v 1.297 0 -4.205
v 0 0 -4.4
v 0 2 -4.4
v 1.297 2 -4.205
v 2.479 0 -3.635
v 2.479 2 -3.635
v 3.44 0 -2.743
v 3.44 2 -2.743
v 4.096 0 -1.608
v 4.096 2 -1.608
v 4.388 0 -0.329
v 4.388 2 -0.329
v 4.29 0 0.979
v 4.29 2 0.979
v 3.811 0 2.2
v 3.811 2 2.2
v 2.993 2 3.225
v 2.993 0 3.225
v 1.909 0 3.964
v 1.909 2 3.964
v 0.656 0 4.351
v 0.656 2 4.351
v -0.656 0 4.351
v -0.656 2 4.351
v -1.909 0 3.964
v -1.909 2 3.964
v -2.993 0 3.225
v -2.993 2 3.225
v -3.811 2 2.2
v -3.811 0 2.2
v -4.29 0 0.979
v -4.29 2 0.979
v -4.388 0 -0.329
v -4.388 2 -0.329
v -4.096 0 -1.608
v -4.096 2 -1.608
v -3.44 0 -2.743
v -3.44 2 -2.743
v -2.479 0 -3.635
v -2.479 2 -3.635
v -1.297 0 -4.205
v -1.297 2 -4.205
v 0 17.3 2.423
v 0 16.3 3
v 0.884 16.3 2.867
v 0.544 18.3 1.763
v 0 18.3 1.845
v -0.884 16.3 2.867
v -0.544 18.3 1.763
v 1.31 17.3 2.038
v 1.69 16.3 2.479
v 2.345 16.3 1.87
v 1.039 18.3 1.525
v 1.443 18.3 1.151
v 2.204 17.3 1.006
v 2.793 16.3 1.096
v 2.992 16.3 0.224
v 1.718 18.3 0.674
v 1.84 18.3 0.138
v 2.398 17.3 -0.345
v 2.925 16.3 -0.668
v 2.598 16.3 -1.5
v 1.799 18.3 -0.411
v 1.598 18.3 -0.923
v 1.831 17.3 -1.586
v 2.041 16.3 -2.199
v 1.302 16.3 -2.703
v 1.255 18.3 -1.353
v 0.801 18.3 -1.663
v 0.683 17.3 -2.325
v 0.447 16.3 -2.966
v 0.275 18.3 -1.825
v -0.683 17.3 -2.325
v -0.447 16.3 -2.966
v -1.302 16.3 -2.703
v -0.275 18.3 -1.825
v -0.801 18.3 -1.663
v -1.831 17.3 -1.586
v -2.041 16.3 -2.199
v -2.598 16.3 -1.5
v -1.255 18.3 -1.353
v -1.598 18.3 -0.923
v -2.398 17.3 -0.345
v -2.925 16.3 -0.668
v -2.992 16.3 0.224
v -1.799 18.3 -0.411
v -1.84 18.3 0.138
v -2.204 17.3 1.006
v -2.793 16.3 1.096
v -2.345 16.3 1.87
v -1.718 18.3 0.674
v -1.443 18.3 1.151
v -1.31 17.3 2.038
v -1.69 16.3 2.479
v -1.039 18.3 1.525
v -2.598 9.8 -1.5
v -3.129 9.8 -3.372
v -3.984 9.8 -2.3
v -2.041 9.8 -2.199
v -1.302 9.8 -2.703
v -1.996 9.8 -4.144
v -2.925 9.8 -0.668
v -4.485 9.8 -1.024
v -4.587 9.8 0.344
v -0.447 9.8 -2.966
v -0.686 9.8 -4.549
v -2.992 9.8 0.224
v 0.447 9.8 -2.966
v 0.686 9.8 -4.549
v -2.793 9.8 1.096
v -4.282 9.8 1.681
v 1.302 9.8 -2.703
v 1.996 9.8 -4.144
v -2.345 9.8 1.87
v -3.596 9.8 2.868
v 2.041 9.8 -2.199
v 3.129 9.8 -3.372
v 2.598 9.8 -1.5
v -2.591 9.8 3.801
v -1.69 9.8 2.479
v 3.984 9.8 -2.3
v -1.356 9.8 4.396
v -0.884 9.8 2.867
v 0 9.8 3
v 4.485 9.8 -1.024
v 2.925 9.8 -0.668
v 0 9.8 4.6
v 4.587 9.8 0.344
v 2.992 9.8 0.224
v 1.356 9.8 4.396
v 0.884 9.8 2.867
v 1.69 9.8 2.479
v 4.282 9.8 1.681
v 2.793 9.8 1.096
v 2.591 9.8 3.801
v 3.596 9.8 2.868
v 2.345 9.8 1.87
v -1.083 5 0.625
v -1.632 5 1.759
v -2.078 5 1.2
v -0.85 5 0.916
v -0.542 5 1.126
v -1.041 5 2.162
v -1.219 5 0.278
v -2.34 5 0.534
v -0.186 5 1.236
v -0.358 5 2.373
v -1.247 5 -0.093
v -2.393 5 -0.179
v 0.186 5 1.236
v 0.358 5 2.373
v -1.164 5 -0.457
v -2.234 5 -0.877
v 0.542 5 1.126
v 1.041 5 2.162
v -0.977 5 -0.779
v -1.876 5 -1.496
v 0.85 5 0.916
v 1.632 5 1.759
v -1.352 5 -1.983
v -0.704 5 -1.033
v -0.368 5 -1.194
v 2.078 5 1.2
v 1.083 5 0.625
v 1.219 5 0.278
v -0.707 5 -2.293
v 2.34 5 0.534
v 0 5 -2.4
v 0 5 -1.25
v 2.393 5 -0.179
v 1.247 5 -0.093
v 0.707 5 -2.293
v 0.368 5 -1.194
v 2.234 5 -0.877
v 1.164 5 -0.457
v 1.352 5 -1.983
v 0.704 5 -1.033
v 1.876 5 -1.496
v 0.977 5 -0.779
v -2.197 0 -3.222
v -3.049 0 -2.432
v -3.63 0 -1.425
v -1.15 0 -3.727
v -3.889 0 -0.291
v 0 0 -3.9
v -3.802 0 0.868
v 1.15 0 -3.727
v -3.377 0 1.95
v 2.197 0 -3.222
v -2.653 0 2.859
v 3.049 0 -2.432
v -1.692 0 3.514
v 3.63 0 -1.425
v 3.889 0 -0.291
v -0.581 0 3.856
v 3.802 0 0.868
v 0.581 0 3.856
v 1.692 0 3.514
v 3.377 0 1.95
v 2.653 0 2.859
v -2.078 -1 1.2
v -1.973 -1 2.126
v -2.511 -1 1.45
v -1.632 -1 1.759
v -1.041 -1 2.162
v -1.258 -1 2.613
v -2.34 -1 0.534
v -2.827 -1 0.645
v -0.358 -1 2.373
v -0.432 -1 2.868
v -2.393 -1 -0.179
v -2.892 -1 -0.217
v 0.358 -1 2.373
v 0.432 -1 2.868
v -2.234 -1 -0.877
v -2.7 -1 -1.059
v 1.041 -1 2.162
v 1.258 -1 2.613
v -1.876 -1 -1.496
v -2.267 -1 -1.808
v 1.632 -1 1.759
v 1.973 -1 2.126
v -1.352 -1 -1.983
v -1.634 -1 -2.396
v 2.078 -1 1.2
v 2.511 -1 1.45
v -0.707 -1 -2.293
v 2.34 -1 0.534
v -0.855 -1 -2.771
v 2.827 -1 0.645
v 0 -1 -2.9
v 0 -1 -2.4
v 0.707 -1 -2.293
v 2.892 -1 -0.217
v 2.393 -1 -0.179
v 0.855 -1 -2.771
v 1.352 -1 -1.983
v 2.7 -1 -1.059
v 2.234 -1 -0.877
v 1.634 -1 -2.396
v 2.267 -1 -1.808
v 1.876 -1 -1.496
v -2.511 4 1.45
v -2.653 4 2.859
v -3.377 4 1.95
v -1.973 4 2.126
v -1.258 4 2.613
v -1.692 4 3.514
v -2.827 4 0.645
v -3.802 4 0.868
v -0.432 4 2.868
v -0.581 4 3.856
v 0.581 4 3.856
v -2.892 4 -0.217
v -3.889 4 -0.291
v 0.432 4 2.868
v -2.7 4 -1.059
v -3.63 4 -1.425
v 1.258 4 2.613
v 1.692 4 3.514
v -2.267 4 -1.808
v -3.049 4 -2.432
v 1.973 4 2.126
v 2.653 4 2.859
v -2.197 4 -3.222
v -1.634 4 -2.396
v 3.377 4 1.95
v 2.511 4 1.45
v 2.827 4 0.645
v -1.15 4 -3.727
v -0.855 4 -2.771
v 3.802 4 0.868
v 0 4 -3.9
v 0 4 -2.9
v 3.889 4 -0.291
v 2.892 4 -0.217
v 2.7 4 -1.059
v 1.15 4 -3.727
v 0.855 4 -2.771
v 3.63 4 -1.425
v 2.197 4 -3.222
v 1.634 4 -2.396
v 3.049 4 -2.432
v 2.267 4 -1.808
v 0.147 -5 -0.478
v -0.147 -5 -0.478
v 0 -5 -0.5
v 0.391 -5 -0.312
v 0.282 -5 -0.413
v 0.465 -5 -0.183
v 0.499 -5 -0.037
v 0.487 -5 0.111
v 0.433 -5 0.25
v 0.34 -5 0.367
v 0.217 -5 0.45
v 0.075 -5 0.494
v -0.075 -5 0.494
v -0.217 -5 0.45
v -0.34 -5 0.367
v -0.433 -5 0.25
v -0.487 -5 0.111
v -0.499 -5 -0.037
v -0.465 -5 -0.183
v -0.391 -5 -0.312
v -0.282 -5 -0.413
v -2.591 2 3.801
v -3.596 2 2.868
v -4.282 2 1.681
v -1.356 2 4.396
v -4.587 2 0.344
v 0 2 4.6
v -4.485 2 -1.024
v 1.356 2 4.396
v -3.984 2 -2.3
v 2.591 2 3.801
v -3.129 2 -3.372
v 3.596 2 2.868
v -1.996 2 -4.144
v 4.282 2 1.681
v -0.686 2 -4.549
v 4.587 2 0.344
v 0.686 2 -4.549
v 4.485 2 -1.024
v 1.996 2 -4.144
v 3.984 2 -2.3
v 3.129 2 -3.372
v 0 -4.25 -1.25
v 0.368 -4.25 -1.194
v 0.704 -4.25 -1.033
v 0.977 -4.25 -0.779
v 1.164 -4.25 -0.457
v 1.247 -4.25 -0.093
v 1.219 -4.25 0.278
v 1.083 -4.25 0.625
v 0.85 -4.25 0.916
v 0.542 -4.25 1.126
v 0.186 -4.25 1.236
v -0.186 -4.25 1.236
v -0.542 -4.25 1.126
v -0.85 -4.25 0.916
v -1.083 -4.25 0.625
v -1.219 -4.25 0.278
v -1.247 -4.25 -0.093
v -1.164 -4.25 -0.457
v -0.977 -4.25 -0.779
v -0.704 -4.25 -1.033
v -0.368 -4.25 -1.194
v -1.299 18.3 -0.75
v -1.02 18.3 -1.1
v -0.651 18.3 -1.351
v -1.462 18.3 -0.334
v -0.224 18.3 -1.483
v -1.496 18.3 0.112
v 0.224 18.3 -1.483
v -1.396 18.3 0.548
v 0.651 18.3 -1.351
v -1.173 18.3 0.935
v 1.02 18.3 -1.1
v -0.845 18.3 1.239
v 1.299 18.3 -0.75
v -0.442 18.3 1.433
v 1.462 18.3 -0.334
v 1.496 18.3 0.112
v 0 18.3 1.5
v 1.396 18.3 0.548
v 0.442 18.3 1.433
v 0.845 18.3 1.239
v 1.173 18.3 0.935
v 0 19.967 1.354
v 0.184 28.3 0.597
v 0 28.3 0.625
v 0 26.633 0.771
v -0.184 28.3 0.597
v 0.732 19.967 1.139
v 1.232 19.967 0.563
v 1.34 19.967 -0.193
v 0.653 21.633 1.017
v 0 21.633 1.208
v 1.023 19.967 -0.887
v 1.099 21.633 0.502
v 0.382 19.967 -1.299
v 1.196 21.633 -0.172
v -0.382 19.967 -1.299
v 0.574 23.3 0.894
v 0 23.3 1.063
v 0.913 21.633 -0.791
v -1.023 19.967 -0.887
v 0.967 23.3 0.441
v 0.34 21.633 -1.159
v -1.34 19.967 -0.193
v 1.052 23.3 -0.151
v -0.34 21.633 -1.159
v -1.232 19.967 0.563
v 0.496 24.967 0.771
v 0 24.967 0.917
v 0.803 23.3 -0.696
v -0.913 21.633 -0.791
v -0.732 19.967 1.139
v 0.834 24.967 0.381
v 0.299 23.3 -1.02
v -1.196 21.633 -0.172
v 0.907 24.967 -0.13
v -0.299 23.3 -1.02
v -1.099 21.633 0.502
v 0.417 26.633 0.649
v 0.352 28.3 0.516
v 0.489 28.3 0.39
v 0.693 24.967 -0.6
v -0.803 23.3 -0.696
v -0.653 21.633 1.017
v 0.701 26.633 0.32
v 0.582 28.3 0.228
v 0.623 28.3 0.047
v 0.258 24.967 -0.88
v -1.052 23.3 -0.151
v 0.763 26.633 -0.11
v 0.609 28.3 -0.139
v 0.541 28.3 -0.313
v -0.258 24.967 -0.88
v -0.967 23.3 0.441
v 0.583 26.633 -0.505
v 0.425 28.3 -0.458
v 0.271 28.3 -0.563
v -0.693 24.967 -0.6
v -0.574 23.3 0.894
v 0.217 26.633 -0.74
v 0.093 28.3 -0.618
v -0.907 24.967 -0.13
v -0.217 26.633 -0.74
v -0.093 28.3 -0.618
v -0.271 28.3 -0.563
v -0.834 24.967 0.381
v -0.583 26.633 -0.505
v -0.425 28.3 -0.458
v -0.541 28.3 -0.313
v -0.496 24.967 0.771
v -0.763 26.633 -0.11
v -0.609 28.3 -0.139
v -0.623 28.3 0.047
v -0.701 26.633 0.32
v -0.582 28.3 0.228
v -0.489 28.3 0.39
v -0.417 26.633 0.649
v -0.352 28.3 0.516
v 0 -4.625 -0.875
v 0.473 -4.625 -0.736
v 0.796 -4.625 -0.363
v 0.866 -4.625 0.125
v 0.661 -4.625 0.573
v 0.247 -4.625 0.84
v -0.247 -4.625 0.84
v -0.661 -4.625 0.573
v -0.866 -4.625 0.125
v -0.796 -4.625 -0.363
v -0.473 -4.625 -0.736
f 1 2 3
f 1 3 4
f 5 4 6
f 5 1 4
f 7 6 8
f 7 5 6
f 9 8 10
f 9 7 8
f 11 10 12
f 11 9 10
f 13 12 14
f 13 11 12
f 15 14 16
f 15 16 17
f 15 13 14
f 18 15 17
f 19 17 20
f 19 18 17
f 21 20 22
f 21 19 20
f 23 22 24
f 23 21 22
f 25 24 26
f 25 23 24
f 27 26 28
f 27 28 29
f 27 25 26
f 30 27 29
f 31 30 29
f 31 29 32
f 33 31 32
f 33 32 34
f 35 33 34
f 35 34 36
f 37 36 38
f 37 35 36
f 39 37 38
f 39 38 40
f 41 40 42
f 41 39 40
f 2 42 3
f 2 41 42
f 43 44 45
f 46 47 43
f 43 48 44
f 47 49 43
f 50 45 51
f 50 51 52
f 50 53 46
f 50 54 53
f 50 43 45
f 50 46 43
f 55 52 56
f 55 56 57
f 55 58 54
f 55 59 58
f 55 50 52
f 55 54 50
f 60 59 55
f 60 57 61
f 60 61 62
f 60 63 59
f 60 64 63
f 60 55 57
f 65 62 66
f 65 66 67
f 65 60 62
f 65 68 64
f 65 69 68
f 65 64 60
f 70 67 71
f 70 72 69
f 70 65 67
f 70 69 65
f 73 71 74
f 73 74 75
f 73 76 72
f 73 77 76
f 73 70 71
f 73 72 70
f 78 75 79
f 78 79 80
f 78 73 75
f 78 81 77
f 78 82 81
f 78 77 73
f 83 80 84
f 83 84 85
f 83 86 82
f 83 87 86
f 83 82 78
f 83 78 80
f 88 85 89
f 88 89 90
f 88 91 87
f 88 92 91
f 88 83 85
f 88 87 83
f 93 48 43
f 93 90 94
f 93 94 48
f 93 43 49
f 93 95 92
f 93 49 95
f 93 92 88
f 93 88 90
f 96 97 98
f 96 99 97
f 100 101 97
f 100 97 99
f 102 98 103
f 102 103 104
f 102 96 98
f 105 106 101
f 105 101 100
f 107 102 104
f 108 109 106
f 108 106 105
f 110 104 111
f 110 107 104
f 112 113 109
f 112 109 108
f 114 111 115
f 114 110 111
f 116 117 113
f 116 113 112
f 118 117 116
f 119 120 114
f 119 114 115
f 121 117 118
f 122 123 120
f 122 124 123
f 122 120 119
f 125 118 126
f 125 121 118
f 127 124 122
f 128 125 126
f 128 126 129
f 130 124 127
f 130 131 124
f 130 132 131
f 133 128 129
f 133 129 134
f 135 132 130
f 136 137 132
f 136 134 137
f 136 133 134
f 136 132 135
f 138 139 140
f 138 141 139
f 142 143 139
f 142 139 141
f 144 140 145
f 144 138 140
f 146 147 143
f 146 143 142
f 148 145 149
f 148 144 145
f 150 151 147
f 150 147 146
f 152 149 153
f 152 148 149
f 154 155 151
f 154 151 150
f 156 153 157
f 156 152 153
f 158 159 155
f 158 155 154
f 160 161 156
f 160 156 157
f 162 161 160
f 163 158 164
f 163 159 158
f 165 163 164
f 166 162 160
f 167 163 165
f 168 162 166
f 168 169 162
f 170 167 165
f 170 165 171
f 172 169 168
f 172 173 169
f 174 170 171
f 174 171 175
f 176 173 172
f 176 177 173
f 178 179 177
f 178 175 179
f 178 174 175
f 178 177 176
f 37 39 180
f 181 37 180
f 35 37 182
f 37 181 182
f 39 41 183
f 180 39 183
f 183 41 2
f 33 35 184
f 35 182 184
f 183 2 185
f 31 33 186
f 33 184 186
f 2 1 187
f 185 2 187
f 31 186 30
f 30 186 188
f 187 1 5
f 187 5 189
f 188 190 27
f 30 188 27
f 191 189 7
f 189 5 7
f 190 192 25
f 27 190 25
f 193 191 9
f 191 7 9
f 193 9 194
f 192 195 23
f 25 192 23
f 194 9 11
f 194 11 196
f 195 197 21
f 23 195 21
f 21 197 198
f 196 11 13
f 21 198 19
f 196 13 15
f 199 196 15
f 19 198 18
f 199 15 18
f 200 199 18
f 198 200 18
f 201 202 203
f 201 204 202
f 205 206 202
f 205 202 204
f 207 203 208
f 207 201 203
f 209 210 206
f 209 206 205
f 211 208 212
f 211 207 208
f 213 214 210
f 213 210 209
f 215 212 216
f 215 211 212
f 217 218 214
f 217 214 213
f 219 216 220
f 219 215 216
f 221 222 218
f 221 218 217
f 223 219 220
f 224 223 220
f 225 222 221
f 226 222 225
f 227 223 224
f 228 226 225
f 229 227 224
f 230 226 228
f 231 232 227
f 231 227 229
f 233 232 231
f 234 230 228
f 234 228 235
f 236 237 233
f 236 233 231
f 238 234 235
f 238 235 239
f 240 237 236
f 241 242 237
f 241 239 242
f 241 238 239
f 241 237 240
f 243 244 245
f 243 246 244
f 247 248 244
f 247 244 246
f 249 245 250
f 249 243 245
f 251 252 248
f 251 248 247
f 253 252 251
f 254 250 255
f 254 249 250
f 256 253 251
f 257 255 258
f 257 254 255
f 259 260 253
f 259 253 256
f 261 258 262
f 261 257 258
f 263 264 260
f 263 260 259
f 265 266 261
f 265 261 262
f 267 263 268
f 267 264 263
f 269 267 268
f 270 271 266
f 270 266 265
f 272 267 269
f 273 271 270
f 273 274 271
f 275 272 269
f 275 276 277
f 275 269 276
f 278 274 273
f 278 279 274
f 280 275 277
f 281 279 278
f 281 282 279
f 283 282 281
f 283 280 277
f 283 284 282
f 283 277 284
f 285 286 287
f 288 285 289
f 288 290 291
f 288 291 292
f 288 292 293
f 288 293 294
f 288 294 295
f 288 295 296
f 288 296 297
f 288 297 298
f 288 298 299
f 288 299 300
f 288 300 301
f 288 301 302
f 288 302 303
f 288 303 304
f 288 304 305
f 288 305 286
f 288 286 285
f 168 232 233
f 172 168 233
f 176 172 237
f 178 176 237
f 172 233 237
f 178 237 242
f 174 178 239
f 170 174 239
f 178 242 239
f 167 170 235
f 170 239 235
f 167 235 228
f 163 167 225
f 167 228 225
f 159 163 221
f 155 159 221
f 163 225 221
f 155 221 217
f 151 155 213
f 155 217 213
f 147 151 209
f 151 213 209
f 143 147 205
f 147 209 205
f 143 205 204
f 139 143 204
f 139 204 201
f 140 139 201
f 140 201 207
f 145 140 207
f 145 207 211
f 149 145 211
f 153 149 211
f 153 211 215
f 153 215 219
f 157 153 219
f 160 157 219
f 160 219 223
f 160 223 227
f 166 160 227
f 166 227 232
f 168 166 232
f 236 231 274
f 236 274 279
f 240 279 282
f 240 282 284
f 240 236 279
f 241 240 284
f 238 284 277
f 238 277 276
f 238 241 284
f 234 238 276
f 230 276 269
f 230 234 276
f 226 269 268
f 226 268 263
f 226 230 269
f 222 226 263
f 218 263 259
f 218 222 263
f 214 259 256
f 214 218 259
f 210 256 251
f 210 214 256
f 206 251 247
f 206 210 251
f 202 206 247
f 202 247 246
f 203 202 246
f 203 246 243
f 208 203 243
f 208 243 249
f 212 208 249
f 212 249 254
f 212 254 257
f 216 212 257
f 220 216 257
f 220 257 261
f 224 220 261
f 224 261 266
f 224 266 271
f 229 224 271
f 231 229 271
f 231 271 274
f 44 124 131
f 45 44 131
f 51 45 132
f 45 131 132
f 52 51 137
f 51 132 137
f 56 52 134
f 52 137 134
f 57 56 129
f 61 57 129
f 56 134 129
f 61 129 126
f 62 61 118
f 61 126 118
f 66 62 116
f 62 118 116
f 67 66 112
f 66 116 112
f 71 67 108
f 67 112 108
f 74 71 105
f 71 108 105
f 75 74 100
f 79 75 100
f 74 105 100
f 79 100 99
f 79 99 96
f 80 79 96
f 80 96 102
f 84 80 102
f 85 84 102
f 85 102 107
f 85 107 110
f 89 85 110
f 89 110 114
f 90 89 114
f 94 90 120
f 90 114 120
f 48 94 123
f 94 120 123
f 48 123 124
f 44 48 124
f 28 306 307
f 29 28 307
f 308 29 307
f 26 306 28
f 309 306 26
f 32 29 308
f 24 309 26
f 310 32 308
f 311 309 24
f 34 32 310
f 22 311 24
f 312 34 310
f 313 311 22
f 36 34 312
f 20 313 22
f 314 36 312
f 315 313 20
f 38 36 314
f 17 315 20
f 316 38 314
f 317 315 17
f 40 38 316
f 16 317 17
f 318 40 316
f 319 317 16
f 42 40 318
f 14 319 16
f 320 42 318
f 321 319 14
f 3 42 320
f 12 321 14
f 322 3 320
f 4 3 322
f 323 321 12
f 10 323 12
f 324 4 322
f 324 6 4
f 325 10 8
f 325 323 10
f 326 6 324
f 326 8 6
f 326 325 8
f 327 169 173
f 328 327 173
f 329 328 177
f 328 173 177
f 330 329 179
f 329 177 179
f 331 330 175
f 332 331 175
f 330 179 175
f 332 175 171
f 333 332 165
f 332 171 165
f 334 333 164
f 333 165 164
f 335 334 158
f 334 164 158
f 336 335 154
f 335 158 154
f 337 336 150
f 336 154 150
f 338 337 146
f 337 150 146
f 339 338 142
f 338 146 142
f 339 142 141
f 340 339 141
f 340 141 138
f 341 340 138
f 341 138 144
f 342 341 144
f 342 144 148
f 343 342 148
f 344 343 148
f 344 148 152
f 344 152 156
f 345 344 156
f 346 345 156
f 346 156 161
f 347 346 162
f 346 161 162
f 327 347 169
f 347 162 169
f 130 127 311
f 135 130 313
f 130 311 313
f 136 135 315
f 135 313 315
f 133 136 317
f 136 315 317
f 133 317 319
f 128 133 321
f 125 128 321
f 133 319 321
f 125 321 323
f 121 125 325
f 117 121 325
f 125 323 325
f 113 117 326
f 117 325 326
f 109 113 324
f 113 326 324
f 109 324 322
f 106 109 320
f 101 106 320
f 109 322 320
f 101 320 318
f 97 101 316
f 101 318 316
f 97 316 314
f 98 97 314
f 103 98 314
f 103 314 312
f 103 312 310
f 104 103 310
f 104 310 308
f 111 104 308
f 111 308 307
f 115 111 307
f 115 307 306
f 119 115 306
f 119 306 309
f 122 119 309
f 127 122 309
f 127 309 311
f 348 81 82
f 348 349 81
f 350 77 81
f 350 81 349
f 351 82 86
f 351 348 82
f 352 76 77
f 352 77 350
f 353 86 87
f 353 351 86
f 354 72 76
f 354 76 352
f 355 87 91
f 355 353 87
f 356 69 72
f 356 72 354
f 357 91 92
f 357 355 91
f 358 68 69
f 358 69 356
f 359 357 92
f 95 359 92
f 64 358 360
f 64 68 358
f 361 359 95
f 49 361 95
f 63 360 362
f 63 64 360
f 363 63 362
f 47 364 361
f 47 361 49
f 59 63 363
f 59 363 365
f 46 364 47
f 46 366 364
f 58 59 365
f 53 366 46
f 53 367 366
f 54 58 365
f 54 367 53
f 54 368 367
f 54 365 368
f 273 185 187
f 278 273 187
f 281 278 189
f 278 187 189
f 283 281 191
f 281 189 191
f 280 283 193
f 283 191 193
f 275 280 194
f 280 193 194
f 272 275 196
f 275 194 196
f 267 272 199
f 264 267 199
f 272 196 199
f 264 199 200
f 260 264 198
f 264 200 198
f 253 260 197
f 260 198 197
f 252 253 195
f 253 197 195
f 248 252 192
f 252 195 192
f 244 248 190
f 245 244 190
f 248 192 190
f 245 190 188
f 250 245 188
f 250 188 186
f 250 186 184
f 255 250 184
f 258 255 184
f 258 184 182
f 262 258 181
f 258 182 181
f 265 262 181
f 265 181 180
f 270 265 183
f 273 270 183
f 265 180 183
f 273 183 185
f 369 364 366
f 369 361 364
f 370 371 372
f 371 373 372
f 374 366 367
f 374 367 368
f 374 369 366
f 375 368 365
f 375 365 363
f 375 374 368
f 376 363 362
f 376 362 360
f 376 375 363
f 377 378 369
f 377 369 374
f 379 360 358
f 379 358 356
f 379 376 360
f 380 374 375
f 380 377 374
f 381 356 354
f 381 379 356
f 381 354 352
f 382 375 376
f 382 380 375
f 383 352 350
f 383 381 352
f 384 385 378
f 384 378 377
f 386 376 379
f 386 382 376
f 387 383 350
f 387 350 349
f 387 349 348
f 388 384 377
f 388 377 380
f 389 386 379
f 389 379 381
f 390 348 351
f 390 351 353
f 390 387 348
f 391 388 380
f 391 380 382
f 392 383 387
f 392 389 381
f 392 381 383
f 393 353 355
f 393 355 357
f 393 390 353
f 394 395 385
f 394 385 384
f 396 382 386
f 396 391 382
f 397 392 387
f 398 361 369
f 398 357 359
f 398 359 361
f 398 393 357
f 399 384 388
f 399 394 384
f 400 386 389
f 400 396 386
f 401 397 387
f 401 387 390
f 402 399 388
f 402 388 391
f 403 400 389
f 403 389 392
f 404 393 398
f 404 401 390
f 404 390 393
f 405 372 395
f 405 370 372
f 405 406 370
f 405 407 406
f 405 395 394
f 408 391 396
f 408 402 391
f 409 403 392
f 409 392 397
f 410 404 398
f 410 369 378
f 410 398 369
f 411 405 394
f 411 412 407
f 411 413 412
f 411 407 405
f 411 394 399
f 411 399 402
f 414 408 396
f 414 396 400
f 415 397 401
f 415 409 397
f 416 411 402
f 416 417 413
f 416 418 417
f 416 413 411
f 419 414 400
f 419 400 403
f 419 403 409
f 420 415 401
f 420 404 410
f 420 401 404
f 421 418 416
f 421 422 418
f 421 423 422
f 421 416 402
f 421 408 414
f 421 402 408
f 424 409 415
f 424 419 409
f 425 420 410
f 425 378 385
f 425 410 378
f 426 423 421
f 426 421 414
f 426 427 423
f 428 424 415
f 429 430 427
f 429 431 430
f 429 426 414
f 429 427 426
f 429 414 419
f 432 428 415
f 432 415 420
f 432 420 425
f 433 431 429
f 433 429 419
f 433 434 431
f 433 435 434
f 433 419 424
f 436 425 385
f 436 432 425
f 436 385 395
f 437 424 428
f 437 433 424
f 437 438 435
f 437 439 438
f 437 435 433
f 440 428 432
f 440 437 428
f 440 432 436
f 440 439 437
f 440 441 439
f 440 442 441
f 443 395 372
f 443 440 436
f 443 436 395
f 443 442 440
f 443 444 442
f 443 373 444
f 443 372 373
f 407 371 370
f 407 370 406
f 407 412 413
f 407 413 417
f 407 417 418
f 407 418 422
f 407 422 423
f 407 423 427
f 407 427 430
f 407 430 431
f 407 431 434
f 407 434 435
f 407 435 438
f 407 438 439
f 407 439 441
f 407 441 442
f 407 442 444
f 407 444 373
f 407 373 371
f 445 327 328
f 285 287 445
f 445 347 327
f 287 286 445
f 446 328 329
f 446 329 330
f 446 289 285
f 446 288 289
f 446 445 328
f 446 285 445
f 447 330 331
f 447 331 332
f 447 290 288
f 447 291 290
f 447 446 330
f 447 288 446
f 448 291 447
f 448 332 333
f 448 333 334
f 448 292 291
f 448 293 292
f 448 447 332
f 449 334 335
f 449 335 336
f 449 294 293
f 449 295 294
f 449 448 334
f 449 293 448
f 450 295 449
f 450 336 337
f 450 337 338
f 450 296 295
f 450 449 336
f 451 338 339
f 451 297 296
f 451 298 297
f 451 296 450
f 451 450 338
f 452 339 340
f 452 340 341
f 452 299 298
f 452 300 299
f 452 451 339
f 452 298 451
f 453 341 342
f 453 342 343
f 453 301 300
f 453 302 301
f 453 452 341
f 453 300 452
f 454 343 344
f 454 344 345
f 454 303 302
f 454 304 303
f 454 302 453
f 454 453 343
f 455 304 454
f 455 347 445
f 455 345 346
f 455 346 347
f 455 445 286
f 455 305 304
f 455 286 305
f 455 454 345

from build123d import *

# Parameters (mm, degrees)
SKETCH_1_R          = 4.6
EXTRUDE_1_DEPTH     = 9.8
SKETCH_2_R          = 4.6
SKETCH_2_R_2        = 4.4
CUT_EXTRUDE_1_DEPTH = 2
SKETCH_3_R          = 3.9
SKETCH_3_R_2        = 2.9
CUT_EXTRUDE_2_DEPTH = 4
SKETCH_4_R          = 2.4
CUT_EXTRUDE_3_DEPTH = 5
SKETCH_5_R          = 1.25
EXTRUDE_4_DEPTH     = 10
CHAMFER_1_SIZE      = 0.75
EXTRUDE_START       = 1
SKETCH_6_R          = 2.9
SKETCH_6_R_2        = 2.4
EXTRUDE_5_DEPTH     = 1
SKETCH_7_R          = 3
EXTRUDE_6_DEPTH     = 8.5
CHAMFER_2_SIZE      = 2
CHAMFER_2_SIZE2     = 1.154700538
SKETCH_8_R          = 1.5
EXTRUDE_7_DEPTH     = 10
CHAMFER_3_SIZE      = 10
CHAMFER_3_SIZE_2    = 0.874886635


with BuildPart() as part:
    # 草图1 → 拉伸1 (new body)
    with BuildSketch(Plane(origin=(0, 0, 0), x_dir=(1, 0, 0), z_dir=(0, 1, 0))):
        with Locations(Location((0, 0, 0), (0, 0, 270))):
            Circle(SKETCH_1_R)
    extrude(amount=EXTRUDE_1_DEPTH)

    # 草图2 → 切除-拉伸1 (cut)
    with BuildSketch(Plane.XZ):
        with Locations(Location((0, 0, 0), (0, 0, 270))):
            Circle(SKETCH_2_R)
        with Locations(Location((0, 0, 0), (0, 0, 270))):
            Circle(SKETCH_2_R_2, mode=Mode.SUBTRACT)
    extrude(amount=-CUT_EXTRUDE_1_DEPTH, mode=Mode.SUBTRACT)

    # 草图3 → 切除-拉伸2 (cut)
    with BuildSketch(Plane.XZ):
        with Locations(Location((0, 0, 0), (0, 0, 270))):
            Circle(SKETCH_3_R)
        with Locations(Location((0, 0, 0), (0, 0, 270))):
            Circle(SKETCH_3_R_2, mode=Mode.SUBTRACT)
    extrude(amount=-CUT_EXTRUDE_2_DEPTH, mode=Mode.SUBTRACT)

    # 草图4 → 切除-拉伸3 (cut)
    with BuildSketch(Plane.XZ):
        with Locations(Location((0, 0, 0), (0, 0, 270))):
            Circle(SKETCH_4_R)
    extrude(amount=-CUT_EXTRUDE_3_DEPTH, mode=Mode.SUBTRACT)

    # 草图5 → 拉伸4 (add)
    with BuildSketch(Plane.XZ.offset(-5)):
        with Locations(Location((0, 0, 0), (0, 0, 270))):
            Circle(SKETCH_5_R)
    extrude(amount=EXTRUDE_4_DEPTH)

    # 倒角1
    chamfer_1_edges = [part.edges().sort_by_distance(p)[0] for p in [
        (0, -5, 1.25),
    ]]
    chamfer(chamfer_1_edges, length=CHAMFER_1_SIZE)

    # 草图6 → 拉伸5 (add)
    with BuildSketch(Plane.XZ.offset(EXTRUDE_START)):
        with Locations(Location((0, 0, 0), (0, 0, 270))):
            Circle(SKETCH_6_R)
        with Locations(Location((0, 0, 0), (0, 0, 270))):
            Circle(SKETCH_6_R_2, mode=Mode.SUBTRACT)
    extrude(amount=-EXTRUDE_5_DEPTH)

    # 草图7 → 拉伸6 (add)
    with BuildSketch(Plane(origin=(0, 9.8, 0), x_dir=(-1, 0, 0), z_dir=(0, 1, 0))):
        with Locations(Location((0, 0, 0), (0, 0, 90))):
            Circle(SKETCH_7_R)
    extrude(amount=EXTRUDE_6_DEPTH)

    # 倒角2
    chamfer_2_edges = [part.edges().sort_by_distance(p)[0] for p in [
        (0, 18.3, -3),
    ]]
    chamfer_2_side = [part.faces().sort_by_distance(p)[0] for p in [
        (0, 14.05, -3),
    ]]
    chamfer(chamfer_2_edges, length=CHAMFER_2_SIZE, length2=CHAMFER_2_SIZE2, reference=chamfer_2_side[0])

    # 草图8 → 拉伸7 (add)
    with BuildSketch(Plane(origin=(0, 18.3, 0), x_dir=(-1, 0, 0), z_dir=(0, 1, 0))):
        with Locations(Location((0, 0, 0), (0, 0, 90))):
            Circle(SKETCH_8_R)
    extrude(amount=EXTRUDE_7_DEPTH)

    # 倒角3
    # the kernel refuses this chamfer: 10, 0.874886635 mm, written as the material it takes off along each edge
    with BuildSketch(Plane(origin=(0, 28.3, 0), x_dir=(0, 0, 1), z_dir=(-1, 0, 0))) as chamfer_3_piece_1_section:
        Polygon((1.5, -CHAMFER_3_SIZE), (1.5 - CHAMFER_3_SIZE_2, 0), (1.5, 0), align=None)
    chamfer_3_piece_1 = revolve(axis=Axis((0, 28.3, 0), (0, 1, 0)), mode=Mode.PRIVATE)
    chamfer_3_piece_1 = split(chamfer_3_piece_1, bisect_by=Plane(origin=(0, 18.3, -1.083102127), z_dir=(0, 1, 0)), keep=Keep.TOP, mode=Mode.PRIVATE)
    add(chamfer_3_piece_1, mode=Mode.SUBTRACT)


solid = part.part
